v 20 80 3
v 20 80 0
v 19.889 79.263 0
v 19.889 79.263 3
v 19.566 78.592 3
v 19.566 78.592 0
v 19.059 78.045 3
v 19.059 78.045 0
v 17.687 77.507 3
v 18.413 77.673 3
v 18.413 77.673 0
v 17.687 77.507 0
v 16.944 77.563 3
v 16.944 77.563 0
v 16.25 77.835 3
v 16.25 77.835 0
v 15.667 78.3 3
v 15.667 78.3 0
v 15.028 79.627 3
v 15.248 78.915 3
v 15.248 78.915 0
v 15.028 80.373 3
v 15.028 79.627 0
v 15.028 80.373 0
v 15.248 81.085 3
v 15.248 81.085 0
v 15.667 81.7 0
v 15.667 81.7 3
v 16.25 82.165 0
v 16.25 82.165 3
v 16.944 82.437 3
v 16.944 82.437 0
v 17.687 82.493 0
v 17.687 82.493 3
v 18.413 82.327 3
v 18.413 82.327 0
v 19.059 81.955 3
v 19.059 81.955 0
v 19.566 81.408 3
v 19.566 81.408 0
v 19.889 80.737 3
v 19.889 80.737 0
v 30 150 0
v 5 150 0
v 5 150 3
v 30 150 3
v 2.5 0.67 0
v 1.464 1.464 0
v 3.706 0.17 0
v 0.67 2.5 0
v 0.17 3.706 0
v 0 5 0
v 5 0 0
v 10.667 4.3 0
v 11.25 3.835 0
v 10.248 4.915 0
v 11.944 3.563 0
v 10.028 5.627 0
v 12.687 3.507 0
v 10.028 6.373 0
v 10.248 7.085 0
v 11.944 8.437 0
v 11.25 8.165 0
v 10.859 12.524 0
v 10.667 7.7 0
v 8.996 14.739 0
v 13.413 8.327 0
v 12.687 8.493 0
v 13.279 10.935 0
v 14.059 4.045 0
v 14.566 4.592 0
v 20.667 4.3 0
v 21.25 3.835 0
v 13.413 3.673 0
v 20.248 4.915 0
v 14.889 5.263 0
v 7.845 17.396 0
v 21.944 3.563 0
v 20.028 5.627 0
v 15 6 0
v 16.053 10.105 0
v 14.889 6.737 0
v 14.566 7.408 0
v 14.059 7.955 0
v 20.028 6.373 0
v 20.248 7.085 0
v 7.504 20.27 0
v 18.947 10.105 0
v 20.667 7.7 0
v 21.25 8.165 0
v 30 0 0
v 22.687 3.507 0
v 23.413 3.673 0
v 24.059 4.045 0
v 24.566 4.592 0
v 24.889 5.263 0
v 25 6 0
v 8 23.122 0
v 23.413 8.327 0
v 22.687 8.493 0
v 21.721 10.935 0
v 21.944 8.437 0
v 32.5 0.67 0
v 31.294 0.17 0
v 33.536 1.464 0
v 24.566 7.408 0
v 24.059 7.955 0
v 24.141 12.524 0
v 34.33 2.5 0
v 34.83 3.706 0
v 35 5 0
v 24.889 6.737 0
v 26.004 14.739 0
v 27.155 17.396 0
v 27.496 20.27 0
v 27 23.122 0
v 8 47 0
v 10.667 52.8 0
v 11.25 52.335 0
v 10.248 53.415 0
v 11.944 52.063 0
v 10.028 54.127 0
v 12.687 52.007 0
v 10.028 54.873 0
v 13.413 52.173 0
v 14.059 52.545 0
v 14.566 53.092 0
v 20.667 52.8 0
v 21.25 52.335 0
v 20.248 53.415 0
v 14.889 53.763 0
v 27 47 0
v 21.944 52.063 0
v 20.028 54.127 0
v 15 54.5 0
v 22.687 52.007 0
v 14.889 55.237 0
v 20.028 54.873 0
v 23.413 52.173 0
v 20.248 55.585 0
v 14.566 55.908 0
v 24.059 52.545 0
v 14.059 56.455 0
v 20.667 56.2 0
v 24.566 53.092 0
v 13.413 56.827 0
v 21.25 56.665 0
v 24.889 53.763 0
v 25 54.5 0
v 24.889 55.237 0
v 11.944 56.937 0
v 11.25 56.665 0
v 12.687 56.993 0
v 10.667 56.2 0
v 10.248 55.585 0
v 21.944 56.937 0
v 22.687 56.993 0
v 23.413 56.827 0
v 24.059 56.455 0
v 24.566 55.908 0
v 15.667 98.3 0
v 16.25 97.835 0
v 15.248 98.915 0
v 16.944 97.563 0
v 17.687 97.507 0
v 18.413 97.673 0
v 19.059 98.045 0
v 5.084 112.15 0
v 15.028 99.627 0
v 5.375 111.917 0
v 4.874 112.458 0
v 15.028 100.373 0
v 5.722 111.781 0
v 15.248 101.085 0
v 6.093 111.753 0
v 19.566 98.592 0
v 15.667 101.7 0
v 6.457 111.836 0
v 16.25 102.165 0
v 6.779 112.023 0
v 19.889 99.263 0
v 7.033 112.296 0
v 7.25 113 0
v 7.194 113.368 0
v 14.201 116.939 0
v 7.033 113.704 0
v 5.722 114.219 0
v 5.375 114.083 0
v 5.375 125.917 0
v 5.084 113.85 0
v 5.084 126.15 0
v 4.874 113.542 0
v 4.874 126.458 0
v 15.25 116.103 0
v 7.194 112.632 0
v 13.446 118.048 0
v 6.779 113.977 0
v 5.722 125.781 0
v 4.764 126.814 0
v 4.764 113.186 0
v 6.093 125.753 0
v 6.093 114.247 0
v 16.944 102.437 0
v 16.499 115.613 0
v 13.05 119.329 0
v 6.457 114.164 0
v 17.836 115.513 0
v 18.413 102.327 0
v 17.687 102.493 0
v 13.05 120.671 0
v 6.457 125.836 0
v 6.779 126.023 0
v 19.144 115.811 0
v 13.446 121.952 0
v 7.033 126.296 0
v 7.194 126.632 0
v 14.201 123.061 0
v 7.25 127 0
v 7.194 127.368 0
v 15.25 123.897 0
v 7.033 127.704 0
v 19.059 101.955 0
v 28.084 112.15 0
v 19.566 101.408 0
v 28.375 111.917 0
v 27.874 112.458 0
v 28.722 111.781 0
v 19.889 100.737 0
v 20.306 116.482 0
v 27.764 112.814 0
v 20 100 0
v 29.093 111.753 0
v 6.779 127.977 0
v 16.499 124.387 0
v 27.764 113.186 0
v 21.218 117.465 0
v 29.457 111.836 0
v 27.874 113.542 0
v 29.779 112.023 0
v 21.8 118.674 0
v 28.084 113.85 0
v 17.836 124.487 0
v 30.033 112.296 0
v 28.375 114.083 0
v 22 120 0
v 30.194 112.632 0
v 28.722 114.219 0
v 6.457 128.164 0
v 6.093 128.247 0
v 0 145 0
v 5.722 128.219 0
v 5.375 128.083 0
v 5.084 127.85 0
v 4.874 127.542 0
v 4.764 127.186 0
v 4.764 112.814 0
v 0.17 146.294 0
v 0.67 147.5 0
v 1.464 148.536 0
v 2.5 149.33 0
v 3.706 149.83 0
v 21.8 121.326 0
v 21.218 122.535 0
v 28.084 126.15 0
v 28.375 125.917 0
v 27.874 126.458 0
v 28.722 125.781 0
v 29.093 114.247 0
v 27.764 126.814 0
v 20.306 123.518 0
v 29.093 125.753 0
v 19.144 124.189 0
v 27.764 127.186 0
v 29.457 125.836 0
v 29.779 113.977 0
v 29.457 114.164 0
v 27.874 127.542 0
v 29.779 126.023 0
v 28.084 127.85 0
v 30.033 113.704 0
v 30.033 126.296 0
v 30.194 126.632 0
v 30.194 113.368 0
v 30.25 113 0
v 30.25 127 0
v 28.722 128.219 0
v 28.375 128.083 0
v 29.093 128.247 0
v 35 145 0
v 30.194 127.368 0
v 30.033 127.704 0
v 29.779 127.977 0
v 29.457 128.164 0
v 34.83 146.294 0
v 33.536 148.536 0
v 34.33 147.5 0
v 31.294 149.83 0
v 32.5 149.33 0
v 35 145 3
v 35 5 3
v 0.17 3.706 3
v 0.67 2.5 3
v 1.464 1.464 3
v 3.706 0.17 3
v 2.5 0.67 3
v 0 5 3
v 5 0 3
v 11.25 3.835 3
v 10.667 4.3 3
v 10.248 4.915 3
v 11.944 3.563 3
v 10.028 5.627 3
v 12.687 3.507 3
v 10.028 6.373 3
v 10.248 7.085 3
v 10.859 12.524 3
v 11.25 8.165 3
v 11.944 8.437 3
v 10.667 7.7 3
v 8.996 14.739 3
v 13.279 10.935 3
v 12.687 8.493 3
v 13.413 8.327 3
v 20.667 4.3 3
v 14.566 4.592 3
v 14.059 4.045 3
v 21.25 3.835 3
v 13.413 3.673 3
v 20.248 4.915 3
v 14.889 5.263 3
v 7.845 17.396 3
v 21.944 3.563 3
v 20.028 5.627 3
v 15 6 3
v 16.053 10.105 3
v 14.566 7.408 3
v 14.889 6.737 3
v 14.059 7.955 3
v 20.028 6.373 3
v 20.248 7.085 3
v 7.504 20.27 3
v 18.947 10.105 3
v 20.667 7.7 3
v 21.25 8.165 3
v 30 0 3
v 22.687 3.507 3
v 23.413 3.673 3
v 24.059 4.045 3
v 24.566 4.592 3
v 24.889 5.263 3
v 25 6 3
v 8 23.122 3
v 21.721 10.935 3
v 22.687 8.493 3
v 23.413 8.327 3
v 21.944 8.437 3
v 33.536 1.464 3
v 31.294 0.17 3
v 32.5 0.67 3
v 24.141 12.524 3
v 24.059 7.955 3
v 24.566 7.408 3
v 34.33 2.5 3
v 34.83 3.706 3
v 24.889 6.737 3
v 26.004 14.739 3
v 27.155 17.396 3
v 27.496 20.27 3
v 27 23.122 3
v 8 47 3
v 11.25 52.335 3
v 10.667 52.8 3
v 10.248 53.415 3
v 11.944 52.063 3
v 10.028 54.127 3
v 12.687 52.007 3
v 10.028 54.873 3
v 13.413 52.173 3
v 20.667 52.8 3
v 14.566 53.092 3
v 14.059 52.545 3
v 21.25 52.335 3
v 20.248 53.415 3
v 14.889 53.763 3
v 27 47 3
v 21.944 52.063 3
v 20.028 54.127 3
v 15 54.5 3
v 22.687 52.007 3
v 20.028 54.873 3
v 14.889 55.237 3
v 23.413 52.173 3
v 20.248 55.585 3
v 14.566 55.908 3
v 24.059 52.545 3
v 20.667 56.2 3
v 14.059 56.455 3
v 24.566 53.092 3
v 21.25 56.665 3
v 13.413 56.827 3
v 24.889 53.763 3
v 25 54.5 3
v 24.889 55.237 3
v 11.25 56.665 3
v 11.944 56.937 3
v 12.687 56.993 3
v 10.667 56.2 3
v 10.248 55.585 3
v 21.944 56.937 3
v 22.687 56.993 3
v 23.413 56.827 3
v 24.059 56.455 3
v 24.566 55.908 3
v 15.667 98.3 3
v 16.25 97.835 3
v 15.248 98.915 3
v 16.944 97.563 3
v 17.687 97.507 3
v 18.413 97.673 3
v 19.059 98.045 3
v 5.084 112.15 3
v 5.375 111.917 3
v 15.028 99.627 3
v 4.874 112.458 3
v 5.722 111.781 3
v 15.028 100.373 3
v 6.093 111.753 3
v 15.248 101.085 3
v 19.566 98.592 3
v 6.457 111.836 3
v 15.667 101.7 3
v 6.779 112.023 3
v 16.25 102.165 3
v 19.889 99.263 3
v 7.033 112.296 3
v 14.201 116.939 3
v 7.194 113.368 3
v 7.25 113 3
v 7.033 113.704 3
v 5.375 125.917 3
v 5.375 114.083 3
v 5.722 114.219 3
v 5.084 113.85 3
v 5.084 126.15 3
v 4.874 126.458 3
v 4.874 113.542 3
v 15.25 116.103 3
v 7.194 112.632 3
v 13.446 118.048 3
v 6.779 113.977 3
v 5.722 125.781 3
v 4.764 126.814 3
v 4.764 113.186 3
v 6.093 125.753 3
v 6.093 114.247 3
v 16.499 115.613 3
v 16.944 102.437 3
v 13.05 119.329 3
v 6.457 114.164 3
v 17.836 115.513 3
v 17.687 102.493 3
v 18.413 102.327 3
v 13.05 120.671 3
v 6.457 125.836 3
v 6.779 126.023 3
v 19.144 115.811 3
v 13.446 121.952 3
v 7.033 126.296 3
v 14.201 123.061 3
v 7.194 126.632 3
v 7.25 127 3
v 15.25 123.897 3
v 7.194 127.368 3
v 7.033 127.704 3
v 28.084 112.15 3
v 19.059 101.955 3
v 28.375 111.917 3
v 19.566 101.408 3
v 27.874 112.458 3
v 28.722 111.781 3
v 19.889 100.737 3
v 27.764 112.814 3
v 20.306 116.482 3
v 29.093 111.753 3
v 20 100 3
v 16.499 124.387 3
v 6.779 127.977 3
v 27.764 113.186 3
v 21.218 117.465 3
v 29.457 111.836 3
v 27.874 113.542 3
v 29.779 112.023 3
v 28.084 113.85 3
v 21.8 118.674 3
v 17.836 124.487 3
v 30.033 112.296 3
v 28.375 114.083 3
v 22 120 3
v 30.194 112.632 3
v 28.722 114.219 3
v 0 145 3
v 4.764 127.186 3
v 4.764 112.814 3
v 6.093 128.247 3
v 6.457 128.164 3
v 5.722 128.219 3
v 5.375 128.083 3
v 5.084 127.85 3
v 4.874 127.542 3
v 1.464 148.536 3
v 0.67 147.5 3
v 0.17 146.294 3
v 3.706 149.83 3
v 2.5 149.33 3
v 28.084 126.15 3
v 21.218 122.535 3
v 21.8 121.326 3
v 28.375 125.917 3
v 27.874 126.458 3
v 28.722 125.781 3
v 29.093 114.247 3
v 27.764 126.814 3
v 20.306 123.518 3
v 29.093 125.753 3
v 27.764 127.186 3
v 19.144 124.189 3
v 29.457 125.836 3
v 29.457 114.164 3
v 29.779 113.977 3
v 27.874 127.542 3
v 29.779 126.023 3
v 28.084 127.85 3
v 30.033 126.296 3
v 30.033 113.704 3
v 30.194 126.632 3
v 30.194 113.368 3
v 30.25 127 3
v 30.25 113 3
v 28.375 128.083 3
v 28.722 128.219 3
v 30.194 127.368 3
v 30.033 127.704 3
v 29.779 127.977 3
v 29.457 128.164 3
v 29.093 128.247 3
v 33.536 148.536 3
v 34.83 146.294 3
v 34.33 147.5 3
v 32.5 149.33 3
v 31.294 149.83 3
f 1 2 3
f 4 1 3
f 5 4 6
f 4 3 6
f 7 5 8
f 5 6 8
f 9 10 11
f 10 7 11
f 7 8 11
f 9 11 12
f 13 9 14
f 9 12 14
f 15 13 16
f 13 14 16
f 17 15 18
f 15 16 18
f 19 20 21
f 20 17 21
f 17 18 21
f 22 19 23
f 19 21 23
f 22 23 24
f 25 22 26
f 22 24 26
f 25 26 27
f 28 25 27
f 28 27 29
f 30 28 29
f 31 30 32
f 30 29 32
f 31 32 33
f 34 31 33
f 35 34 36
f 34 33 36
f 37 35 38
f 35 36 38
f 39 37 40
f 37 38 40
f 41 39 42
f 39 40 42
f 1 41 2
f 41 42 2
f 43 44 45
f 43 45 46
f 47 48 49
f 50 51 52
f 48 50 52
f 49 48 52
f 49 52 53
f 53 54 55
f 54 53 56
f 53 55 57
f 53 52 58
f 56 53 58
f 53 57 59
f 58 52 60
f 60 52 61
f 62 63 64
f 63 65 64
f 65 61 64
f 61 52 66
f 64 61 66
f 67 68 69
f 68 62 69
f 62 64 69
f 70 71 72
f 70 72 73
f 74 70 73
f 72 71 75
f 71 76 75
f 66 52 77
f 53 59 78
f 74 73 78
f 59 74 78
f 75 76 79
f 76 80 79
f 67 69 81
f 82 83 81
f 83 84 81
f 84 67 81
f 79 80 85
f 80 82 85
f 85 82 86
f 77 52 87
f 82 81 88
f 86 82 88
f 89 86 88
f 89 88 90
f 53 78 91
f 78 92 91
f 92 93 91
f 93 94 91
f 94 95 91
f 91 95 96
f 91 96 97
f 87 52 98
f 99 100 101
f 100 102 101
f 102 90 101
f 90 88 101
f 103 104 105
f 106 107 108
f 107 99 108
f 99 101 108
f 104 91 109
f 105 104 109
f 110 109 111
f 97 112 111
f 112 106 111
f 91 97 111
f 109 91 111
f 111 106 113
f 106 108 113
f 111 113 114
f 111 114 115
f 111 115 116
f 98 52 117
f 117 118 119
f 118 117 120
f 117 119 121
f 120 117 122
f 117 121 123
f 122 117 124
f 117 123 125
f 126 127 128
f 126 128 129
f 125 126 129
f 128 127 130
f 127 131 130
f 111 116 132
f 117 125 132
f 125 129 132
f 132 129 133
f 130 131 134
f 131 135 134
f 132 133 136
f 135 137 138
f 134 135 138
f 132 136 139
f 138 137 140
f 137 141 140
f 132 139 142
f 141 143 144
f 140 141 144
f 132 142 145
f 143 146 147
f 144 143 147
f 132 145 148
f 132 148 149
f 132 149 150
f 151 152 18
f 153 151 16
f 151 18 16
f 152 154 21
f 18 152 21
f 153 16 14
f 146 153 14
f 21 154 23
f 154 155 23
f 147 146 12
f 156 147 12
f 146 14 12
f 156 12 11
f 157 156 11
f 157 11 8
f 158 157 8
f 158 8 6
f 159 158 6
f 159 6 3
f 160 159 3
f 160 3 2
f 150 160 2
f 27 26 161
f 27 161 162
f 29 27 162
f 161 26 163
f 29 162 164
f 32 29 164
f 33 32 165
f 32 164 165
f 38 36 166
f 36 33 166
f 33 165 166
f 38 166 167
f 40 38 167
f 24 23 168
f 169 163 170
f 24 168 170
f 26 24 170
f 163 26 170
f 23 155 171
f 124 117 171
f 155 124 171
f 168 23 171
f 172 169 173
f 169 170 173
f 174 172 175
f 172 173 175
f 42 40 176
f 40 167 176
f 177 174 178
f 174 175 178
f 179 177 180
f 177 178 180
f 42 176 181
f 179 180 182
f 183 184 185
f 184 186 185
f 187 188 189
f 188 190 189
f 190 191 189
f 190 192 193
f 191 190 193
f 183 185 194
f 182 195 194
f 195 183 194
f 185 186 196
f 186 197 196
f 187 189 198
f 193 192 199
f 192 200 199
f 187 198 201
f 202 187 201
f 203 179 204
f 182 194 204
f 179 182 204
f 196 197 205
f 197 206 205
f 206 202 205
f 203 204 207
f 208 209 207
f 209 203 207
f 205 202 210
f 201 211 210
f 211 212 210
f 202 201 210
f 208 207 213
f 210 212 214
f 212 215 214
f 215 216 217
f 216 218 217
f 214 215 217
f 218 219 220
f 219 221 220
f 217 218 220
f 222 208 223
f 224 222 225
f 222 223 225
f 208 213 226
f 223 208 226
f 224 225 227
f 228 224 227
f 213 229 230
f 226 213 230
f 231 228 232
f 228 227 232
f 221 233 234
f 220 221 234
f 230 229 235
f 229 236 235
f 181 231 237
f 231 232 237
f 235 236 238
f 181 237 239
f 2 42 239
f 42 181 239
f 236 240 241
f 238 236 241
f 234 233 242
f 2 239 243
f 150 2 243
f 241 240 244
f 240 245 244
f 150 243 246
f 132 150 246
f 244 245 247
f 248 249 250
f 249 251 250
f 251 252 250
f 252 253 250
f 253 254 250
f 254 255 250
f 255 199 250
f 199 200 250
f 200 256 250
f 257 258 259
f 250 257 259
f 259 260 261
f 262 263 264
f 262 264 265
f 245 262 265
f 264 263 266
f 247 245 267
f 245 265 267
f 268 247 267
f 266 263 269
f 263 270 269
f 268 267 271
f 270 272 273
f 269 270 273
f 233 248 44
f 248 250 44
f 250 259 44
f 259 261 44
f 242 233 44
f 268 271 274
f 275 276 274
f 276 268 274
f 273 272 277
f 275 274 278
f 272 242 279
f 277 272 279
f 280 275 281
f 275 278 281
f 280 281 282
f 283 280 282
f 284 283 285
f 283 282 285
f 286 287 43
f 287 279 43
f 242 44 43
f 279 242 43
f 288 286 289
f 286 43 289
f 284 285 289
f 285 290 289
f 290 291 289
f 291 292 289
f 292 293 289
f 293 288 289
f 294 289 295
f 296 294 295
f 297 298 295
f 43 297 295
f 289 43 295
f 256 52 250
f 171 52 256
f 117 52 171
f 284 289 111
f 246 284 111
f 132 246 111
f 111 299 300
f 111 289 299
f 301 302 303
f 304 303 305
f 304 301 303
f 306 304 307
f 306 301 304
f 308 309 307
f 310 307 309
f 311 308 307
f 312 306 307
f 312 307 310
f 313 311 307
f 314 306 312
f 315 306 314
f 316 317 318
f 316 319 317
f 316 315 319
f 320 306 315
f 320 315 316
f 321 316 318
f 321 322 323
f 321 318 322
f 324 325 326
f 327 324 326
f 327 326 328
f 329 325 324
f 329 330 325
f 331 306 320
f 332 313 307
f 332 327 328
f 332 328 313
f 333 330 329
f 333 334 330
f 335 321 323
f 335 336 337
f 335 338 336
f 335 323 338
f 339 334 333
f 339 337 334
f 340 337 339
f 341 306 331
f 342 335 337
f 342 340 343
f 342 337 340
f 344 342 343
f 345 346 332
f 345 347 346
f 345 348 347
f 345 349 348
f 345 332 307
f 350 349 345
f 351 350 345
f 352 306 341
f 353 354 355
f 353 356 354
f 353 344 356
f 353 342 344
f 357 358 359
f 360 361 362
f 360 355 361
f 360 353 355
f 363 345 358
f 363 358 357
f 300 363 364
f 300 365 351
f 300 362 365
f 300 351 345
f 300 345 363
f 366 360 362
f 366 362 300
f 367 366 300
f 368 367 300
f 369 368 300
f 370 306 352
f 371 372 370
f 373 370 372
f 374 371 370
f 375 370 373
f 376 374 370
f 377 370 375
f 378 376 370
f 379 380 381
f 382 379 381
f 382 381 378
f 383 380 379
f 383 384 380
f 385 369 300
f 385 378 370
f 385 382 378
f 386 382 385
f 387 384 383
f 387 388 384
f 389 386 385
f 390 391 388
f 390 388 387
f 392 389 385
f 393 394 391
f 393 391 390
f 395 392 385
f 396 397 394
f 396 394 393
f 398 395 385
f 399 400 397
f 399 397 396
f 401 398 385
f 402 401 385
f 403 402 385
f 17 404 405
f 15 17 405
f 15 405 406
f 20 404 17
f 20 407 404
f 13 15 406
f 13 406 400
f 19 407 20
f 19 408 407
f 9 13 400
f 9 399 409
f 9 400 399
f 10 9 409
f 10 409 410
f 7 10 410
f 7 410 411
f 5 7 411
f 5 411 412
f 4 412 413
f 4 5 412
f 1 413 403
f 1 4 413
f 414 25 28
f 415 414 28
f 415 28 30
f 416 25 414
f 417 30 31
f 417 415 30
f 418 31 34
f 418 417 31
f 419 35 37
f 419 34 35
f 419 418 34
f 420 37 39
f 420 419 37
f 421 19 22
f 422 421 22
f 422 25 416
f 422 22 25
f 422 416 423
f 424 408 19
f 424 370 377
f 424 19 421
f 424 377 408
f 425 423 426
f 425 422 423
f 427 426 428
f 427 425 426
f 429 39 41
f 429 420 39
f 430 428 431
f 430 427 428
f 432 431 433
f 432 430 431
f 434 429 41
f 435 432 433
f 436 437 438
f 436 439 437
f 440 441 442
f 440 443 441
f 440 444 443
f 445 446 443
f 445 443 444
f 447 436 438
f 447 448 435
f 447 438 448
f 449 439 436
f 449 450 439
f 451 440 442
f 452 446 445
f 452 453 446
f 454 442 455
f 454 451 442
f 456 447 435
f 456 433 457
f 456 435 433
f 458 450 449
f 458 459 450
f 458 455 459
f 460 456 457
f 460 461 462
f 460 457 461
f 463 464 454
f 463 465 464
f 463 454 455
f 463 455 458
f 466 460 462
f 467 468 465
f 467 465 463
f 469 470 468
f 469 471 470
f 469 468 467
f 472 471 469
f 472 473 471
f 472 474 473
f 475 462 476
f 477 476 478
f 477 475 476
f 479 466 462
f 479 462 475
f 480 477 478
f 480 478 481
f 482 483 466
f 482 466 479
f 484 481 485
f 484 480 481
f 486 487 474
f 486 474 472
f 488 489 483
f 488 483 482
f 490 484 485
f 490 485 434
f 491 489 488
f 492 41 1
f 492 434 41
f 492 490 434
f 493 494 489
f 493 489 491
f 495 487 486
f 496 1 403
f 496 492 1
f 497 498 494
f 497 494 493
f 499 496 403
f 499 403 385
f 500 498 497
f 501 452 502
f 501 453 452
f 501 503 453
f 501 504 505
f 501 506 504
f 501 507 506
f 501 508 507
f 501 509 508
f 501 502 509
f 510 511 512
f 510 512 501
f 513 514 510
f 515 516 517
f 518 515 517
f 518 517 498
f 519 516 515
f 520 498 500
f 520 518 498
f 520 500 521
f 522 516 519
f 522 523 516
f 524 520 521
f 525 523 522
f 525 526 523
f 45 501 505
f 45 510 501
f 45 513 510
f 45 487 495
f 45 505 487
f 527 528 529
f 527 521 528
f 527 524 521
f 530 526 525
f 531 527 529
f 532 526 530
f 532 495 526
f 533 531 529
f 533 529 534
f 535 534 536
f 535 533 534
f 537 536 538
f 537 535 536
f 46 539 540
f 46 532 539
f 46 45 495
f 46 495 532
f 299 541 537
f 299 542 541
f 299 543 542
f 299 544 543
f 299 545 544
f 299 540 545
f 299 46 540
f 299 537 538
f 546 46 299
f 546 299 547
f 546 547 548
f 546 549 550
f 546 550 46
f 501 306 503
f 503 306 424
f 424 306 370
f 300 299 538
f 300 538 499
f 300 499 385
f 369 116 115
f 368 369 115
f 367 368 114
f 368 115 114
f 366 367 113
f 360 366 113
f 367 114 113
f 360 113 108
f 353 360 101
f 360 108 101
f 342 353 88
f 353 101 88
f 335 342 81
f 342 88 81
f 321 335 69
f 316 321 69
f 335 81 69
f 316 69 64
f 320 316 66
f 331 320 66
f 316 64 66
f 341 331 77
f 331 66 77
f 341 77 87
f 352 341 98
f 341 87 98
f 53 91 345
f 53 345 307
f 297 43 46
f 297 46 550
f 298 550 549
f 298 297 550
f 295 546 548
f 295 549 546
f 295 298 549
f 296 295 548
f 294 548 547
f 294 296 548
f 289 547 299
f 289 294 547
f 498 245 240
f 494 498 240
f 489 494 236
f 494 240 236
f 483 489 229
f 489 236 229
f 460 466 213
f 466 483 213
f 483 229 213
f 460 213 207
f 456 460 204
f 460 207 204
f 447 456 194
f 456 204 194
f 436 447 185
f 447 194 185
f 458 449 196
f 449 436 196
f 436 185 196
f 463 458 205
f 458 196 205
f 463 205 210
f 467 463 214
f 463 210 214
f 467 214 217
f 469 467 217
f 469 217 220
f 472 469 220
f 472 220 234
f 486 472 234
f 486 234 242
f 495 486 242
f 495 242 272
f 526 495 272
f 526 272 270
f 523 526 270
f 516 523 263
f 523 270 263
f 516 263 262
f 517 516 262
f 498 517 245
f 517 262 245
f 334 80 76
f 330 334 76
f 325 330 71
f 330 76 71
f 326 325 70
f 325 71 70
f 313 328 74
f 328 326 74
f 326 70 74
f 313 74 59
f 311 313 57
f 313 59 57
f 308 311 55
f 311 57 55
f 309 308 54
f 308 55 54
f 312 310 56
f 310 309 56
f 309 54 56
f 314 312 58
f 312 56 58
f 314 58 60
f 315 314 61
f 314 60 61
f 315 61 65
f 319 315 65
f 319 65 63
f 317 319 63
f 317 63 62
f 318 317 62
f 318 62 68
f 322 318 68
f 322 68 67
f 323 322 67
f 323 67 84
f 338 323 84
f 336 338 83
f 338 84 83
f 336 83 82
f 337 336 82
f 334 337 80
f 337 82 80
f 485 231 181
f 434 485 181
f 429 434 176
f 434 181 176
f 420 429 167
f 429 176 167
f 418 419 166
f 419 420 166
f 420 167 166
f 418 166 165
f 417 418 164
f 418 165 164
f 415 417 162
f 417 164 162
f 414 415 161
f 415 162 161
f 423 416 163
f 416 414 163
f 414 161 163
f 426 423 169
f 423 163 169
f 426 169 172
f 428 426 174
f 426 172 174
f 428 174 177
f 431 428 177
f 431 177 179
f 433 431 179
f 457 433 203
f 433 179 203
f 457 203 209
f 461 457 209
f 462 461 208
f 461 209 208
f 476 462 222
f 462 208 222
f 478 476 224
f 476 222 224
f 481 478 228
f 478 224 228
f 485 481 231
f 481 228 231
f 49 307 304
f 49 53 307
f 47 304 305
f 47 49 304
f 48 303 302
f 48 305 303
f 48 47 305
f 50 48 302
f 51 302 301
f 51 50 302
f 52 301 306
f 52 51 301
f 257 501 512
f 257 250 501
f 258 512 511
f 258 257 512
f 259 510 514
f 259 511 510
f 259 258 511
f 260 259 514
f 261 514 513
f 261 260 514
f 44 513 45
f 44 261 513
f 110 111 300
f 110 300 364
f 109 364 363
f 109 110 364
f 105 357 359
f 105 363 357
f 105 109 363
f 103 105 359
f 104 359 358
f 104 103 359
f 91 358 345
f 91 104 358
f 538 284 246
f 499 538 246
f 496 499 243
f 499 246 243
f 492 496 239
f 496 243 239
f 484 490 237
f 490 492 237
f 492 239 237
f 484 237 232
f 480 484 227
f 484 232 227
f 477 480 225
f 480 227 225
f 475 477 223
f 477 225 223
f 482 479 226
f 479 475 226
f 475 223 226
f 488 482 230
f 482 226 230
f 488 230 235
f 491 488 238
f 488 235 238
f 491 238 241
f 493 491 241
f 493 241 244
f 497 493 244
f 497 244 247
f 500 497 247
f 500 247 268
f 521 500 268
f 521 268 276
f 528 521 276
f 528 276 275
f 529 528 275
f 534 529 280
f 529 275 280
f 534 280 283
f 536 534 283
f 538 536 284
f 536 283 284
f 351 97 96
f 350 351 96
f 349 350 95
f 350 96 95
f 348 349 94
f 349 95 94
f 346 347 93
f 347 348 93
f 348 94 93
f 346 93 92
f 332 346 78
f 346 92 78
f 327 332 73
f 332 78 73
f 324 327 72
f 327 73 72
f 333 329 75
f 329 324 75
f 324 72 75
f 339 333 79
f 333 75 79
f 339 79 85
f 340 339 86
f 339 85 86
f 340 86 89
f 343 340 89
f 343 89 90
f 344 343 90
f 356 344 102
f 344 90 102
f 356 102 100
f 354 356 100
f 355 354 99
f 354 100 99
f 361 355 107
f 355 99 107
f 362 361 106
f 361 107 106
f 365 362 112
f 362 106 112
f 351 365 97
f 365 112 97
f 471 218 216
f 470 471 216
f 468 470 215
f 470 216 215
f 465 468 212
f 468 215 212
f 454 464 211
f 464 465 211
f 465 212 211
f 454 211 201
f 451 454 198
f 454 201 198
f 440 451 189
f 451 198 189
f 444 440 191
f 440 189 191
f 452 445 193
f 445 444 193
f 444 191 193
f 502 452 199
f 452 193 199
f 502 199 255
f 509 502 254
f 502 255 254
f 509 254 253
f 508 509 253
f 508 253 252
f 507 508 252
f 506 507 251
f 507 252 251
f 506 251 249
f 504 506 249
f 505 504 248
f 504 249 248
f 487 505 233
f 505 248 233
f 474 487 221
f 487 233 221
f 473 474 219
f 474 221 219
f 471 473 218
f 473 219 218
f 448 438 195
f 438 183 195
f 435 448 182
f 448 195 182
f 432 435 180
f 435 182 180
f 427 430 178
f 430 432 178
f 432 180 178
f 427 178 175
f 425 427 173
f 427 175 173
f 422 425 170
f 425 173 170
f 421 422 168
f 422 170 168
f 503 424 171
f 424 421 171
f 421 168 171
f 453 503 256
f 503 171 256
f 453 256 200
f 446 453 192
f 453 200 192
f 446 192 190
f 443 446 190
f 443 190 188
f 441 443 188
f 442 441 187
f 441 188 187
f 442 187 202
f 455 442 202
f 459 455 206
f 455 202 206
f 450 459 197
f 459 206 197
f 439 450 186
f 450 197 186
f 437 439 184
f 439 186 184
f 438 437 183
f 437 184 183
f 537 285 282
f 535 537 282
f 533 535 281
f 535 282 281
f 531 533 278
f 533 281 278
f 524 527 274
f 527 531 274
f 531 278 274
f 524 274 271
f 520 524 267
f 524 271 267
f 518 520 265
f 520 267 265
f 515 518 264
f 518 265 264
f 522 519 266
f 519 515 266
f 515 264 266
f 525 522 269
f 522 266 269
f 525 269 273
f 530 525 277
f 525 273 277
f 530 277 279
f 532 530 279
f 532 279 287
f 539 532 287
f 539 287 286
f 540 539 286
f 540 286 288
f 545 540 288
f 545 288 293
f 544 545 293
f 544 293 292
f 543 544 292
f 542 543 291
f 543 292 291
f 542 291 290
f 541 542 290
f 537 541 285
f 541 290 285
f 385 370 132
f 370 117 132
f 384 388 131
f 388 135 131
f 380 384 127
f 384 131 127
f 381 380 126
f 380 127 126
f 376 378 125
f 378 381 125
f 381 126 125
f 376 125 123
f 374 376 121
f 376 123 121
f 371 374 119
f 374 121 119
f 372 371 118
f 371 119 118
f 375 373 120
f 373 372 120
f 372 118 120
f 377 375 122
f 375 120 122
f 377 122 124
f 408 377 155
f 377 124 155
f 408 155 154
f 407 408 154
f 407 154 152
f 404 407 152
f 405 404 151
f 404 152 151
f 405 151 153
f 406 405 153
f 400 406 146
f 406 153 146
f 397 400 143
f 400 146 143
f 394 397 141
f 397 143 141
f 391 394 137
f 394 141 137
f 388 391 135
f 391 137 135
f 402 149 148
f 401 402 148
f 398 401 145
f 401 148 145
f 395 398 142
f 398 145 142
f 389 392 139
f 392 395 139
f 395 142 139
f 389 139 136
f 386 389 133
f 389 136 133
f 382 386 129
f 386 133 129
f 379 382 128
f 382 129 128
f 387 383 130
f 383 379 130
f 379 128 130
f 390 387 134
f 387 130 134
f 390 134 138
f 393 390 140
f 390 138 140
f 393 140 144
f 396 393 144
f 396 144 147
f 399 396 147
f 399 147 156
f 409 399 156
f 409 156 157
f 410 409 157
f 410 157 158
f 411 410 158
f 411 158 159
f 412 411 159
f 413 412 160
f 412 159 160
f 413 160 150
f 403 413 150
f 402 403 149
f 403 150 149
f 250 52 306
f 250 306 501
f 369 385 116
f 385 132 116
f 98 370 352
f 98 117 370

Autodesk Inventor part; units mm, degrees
ref_plane "YZ Plane" through (0, 0, 0) normal (1, 0, 0) x (0, 1, 0)
ref_plane "XZ Plane" through (0, 0, 0) normal (0, 1, 0) x (-1, 0, 0)
ref_plane "XY Plane" through (0, 0, 0) normal (0, 0, 1) x (1, 0, 0)
sketch "Boceto1" plane through (0, 0, 0) normal (0, 0, 1) x (1, 0, 0)
  line L0 (0, 5) -> (0, 145)
  line L1 (5, 150) -> (30, 150)
  line L2 (35, 145) -> (35, 5)
  line L3 (30, 0) -> (5, 0)
  arc A0 (5, 150) -> (0, 145) centre (5, 145) ccw
  arc A1 (35, 145) -> (30, 150) centre (30, 145) ccw
  arc A2 (0, 5) -> (5, 0) centre (5, 5) ccw
  arc A3 (30, 0) -> (35, 5) centre (30, 5) ccw
  circle A4 centre (17.5, 120) radius 4.5
  circle A5 centre (17.5, 100) radius 2.5
  circle A6 centre (17.5, 80) radius 2.5
  circle A7 centre (17.5, 20) radius 6.5
  circle A8 centre (22.5, 54.5) radius 2.5
  circle A9 centre (12.5, 54.5) radius 2.5
  circle A10 centre (12.5, 6) radius 2.5
  circle A11 centre (22.5, 6) radius 2.5
  circle A12 centre (6, 127) radius 1.25
  circle A13 centre (6, 113) radius 1.25
  circle A14 centre (29, 113) radius 1.25
  circle A15 centre (29, 127) radius 1.25
  point P0 (0, 0)
extrude "Extrusión1" add sketch "Boceto1" along normal blind 3
sketch "Boceto2" plane through (0, 0, 0) normal (0, 0, -1) x (-1, 0, 0)
  circle A0 centre (-17.5, 20) radius 6.5 projected
  arc A1 (-27, 23.1225) -> (-8, 23.1225) centre (-17.5, 20) ccw
  line L0 (-17.5, 47) -> (-27, 47)
  line L1 (-27, 47) -> (-8, 47)
  line L2 (-8, 47) -> (-8, 23.1225)
  line L3 (-27, 47) -> (-27, 23.1225)
  point P0 (0, 0)
extrude "Extrusión2" cut sketch "Boceto2" against normal blind 10
properties part number "3"
